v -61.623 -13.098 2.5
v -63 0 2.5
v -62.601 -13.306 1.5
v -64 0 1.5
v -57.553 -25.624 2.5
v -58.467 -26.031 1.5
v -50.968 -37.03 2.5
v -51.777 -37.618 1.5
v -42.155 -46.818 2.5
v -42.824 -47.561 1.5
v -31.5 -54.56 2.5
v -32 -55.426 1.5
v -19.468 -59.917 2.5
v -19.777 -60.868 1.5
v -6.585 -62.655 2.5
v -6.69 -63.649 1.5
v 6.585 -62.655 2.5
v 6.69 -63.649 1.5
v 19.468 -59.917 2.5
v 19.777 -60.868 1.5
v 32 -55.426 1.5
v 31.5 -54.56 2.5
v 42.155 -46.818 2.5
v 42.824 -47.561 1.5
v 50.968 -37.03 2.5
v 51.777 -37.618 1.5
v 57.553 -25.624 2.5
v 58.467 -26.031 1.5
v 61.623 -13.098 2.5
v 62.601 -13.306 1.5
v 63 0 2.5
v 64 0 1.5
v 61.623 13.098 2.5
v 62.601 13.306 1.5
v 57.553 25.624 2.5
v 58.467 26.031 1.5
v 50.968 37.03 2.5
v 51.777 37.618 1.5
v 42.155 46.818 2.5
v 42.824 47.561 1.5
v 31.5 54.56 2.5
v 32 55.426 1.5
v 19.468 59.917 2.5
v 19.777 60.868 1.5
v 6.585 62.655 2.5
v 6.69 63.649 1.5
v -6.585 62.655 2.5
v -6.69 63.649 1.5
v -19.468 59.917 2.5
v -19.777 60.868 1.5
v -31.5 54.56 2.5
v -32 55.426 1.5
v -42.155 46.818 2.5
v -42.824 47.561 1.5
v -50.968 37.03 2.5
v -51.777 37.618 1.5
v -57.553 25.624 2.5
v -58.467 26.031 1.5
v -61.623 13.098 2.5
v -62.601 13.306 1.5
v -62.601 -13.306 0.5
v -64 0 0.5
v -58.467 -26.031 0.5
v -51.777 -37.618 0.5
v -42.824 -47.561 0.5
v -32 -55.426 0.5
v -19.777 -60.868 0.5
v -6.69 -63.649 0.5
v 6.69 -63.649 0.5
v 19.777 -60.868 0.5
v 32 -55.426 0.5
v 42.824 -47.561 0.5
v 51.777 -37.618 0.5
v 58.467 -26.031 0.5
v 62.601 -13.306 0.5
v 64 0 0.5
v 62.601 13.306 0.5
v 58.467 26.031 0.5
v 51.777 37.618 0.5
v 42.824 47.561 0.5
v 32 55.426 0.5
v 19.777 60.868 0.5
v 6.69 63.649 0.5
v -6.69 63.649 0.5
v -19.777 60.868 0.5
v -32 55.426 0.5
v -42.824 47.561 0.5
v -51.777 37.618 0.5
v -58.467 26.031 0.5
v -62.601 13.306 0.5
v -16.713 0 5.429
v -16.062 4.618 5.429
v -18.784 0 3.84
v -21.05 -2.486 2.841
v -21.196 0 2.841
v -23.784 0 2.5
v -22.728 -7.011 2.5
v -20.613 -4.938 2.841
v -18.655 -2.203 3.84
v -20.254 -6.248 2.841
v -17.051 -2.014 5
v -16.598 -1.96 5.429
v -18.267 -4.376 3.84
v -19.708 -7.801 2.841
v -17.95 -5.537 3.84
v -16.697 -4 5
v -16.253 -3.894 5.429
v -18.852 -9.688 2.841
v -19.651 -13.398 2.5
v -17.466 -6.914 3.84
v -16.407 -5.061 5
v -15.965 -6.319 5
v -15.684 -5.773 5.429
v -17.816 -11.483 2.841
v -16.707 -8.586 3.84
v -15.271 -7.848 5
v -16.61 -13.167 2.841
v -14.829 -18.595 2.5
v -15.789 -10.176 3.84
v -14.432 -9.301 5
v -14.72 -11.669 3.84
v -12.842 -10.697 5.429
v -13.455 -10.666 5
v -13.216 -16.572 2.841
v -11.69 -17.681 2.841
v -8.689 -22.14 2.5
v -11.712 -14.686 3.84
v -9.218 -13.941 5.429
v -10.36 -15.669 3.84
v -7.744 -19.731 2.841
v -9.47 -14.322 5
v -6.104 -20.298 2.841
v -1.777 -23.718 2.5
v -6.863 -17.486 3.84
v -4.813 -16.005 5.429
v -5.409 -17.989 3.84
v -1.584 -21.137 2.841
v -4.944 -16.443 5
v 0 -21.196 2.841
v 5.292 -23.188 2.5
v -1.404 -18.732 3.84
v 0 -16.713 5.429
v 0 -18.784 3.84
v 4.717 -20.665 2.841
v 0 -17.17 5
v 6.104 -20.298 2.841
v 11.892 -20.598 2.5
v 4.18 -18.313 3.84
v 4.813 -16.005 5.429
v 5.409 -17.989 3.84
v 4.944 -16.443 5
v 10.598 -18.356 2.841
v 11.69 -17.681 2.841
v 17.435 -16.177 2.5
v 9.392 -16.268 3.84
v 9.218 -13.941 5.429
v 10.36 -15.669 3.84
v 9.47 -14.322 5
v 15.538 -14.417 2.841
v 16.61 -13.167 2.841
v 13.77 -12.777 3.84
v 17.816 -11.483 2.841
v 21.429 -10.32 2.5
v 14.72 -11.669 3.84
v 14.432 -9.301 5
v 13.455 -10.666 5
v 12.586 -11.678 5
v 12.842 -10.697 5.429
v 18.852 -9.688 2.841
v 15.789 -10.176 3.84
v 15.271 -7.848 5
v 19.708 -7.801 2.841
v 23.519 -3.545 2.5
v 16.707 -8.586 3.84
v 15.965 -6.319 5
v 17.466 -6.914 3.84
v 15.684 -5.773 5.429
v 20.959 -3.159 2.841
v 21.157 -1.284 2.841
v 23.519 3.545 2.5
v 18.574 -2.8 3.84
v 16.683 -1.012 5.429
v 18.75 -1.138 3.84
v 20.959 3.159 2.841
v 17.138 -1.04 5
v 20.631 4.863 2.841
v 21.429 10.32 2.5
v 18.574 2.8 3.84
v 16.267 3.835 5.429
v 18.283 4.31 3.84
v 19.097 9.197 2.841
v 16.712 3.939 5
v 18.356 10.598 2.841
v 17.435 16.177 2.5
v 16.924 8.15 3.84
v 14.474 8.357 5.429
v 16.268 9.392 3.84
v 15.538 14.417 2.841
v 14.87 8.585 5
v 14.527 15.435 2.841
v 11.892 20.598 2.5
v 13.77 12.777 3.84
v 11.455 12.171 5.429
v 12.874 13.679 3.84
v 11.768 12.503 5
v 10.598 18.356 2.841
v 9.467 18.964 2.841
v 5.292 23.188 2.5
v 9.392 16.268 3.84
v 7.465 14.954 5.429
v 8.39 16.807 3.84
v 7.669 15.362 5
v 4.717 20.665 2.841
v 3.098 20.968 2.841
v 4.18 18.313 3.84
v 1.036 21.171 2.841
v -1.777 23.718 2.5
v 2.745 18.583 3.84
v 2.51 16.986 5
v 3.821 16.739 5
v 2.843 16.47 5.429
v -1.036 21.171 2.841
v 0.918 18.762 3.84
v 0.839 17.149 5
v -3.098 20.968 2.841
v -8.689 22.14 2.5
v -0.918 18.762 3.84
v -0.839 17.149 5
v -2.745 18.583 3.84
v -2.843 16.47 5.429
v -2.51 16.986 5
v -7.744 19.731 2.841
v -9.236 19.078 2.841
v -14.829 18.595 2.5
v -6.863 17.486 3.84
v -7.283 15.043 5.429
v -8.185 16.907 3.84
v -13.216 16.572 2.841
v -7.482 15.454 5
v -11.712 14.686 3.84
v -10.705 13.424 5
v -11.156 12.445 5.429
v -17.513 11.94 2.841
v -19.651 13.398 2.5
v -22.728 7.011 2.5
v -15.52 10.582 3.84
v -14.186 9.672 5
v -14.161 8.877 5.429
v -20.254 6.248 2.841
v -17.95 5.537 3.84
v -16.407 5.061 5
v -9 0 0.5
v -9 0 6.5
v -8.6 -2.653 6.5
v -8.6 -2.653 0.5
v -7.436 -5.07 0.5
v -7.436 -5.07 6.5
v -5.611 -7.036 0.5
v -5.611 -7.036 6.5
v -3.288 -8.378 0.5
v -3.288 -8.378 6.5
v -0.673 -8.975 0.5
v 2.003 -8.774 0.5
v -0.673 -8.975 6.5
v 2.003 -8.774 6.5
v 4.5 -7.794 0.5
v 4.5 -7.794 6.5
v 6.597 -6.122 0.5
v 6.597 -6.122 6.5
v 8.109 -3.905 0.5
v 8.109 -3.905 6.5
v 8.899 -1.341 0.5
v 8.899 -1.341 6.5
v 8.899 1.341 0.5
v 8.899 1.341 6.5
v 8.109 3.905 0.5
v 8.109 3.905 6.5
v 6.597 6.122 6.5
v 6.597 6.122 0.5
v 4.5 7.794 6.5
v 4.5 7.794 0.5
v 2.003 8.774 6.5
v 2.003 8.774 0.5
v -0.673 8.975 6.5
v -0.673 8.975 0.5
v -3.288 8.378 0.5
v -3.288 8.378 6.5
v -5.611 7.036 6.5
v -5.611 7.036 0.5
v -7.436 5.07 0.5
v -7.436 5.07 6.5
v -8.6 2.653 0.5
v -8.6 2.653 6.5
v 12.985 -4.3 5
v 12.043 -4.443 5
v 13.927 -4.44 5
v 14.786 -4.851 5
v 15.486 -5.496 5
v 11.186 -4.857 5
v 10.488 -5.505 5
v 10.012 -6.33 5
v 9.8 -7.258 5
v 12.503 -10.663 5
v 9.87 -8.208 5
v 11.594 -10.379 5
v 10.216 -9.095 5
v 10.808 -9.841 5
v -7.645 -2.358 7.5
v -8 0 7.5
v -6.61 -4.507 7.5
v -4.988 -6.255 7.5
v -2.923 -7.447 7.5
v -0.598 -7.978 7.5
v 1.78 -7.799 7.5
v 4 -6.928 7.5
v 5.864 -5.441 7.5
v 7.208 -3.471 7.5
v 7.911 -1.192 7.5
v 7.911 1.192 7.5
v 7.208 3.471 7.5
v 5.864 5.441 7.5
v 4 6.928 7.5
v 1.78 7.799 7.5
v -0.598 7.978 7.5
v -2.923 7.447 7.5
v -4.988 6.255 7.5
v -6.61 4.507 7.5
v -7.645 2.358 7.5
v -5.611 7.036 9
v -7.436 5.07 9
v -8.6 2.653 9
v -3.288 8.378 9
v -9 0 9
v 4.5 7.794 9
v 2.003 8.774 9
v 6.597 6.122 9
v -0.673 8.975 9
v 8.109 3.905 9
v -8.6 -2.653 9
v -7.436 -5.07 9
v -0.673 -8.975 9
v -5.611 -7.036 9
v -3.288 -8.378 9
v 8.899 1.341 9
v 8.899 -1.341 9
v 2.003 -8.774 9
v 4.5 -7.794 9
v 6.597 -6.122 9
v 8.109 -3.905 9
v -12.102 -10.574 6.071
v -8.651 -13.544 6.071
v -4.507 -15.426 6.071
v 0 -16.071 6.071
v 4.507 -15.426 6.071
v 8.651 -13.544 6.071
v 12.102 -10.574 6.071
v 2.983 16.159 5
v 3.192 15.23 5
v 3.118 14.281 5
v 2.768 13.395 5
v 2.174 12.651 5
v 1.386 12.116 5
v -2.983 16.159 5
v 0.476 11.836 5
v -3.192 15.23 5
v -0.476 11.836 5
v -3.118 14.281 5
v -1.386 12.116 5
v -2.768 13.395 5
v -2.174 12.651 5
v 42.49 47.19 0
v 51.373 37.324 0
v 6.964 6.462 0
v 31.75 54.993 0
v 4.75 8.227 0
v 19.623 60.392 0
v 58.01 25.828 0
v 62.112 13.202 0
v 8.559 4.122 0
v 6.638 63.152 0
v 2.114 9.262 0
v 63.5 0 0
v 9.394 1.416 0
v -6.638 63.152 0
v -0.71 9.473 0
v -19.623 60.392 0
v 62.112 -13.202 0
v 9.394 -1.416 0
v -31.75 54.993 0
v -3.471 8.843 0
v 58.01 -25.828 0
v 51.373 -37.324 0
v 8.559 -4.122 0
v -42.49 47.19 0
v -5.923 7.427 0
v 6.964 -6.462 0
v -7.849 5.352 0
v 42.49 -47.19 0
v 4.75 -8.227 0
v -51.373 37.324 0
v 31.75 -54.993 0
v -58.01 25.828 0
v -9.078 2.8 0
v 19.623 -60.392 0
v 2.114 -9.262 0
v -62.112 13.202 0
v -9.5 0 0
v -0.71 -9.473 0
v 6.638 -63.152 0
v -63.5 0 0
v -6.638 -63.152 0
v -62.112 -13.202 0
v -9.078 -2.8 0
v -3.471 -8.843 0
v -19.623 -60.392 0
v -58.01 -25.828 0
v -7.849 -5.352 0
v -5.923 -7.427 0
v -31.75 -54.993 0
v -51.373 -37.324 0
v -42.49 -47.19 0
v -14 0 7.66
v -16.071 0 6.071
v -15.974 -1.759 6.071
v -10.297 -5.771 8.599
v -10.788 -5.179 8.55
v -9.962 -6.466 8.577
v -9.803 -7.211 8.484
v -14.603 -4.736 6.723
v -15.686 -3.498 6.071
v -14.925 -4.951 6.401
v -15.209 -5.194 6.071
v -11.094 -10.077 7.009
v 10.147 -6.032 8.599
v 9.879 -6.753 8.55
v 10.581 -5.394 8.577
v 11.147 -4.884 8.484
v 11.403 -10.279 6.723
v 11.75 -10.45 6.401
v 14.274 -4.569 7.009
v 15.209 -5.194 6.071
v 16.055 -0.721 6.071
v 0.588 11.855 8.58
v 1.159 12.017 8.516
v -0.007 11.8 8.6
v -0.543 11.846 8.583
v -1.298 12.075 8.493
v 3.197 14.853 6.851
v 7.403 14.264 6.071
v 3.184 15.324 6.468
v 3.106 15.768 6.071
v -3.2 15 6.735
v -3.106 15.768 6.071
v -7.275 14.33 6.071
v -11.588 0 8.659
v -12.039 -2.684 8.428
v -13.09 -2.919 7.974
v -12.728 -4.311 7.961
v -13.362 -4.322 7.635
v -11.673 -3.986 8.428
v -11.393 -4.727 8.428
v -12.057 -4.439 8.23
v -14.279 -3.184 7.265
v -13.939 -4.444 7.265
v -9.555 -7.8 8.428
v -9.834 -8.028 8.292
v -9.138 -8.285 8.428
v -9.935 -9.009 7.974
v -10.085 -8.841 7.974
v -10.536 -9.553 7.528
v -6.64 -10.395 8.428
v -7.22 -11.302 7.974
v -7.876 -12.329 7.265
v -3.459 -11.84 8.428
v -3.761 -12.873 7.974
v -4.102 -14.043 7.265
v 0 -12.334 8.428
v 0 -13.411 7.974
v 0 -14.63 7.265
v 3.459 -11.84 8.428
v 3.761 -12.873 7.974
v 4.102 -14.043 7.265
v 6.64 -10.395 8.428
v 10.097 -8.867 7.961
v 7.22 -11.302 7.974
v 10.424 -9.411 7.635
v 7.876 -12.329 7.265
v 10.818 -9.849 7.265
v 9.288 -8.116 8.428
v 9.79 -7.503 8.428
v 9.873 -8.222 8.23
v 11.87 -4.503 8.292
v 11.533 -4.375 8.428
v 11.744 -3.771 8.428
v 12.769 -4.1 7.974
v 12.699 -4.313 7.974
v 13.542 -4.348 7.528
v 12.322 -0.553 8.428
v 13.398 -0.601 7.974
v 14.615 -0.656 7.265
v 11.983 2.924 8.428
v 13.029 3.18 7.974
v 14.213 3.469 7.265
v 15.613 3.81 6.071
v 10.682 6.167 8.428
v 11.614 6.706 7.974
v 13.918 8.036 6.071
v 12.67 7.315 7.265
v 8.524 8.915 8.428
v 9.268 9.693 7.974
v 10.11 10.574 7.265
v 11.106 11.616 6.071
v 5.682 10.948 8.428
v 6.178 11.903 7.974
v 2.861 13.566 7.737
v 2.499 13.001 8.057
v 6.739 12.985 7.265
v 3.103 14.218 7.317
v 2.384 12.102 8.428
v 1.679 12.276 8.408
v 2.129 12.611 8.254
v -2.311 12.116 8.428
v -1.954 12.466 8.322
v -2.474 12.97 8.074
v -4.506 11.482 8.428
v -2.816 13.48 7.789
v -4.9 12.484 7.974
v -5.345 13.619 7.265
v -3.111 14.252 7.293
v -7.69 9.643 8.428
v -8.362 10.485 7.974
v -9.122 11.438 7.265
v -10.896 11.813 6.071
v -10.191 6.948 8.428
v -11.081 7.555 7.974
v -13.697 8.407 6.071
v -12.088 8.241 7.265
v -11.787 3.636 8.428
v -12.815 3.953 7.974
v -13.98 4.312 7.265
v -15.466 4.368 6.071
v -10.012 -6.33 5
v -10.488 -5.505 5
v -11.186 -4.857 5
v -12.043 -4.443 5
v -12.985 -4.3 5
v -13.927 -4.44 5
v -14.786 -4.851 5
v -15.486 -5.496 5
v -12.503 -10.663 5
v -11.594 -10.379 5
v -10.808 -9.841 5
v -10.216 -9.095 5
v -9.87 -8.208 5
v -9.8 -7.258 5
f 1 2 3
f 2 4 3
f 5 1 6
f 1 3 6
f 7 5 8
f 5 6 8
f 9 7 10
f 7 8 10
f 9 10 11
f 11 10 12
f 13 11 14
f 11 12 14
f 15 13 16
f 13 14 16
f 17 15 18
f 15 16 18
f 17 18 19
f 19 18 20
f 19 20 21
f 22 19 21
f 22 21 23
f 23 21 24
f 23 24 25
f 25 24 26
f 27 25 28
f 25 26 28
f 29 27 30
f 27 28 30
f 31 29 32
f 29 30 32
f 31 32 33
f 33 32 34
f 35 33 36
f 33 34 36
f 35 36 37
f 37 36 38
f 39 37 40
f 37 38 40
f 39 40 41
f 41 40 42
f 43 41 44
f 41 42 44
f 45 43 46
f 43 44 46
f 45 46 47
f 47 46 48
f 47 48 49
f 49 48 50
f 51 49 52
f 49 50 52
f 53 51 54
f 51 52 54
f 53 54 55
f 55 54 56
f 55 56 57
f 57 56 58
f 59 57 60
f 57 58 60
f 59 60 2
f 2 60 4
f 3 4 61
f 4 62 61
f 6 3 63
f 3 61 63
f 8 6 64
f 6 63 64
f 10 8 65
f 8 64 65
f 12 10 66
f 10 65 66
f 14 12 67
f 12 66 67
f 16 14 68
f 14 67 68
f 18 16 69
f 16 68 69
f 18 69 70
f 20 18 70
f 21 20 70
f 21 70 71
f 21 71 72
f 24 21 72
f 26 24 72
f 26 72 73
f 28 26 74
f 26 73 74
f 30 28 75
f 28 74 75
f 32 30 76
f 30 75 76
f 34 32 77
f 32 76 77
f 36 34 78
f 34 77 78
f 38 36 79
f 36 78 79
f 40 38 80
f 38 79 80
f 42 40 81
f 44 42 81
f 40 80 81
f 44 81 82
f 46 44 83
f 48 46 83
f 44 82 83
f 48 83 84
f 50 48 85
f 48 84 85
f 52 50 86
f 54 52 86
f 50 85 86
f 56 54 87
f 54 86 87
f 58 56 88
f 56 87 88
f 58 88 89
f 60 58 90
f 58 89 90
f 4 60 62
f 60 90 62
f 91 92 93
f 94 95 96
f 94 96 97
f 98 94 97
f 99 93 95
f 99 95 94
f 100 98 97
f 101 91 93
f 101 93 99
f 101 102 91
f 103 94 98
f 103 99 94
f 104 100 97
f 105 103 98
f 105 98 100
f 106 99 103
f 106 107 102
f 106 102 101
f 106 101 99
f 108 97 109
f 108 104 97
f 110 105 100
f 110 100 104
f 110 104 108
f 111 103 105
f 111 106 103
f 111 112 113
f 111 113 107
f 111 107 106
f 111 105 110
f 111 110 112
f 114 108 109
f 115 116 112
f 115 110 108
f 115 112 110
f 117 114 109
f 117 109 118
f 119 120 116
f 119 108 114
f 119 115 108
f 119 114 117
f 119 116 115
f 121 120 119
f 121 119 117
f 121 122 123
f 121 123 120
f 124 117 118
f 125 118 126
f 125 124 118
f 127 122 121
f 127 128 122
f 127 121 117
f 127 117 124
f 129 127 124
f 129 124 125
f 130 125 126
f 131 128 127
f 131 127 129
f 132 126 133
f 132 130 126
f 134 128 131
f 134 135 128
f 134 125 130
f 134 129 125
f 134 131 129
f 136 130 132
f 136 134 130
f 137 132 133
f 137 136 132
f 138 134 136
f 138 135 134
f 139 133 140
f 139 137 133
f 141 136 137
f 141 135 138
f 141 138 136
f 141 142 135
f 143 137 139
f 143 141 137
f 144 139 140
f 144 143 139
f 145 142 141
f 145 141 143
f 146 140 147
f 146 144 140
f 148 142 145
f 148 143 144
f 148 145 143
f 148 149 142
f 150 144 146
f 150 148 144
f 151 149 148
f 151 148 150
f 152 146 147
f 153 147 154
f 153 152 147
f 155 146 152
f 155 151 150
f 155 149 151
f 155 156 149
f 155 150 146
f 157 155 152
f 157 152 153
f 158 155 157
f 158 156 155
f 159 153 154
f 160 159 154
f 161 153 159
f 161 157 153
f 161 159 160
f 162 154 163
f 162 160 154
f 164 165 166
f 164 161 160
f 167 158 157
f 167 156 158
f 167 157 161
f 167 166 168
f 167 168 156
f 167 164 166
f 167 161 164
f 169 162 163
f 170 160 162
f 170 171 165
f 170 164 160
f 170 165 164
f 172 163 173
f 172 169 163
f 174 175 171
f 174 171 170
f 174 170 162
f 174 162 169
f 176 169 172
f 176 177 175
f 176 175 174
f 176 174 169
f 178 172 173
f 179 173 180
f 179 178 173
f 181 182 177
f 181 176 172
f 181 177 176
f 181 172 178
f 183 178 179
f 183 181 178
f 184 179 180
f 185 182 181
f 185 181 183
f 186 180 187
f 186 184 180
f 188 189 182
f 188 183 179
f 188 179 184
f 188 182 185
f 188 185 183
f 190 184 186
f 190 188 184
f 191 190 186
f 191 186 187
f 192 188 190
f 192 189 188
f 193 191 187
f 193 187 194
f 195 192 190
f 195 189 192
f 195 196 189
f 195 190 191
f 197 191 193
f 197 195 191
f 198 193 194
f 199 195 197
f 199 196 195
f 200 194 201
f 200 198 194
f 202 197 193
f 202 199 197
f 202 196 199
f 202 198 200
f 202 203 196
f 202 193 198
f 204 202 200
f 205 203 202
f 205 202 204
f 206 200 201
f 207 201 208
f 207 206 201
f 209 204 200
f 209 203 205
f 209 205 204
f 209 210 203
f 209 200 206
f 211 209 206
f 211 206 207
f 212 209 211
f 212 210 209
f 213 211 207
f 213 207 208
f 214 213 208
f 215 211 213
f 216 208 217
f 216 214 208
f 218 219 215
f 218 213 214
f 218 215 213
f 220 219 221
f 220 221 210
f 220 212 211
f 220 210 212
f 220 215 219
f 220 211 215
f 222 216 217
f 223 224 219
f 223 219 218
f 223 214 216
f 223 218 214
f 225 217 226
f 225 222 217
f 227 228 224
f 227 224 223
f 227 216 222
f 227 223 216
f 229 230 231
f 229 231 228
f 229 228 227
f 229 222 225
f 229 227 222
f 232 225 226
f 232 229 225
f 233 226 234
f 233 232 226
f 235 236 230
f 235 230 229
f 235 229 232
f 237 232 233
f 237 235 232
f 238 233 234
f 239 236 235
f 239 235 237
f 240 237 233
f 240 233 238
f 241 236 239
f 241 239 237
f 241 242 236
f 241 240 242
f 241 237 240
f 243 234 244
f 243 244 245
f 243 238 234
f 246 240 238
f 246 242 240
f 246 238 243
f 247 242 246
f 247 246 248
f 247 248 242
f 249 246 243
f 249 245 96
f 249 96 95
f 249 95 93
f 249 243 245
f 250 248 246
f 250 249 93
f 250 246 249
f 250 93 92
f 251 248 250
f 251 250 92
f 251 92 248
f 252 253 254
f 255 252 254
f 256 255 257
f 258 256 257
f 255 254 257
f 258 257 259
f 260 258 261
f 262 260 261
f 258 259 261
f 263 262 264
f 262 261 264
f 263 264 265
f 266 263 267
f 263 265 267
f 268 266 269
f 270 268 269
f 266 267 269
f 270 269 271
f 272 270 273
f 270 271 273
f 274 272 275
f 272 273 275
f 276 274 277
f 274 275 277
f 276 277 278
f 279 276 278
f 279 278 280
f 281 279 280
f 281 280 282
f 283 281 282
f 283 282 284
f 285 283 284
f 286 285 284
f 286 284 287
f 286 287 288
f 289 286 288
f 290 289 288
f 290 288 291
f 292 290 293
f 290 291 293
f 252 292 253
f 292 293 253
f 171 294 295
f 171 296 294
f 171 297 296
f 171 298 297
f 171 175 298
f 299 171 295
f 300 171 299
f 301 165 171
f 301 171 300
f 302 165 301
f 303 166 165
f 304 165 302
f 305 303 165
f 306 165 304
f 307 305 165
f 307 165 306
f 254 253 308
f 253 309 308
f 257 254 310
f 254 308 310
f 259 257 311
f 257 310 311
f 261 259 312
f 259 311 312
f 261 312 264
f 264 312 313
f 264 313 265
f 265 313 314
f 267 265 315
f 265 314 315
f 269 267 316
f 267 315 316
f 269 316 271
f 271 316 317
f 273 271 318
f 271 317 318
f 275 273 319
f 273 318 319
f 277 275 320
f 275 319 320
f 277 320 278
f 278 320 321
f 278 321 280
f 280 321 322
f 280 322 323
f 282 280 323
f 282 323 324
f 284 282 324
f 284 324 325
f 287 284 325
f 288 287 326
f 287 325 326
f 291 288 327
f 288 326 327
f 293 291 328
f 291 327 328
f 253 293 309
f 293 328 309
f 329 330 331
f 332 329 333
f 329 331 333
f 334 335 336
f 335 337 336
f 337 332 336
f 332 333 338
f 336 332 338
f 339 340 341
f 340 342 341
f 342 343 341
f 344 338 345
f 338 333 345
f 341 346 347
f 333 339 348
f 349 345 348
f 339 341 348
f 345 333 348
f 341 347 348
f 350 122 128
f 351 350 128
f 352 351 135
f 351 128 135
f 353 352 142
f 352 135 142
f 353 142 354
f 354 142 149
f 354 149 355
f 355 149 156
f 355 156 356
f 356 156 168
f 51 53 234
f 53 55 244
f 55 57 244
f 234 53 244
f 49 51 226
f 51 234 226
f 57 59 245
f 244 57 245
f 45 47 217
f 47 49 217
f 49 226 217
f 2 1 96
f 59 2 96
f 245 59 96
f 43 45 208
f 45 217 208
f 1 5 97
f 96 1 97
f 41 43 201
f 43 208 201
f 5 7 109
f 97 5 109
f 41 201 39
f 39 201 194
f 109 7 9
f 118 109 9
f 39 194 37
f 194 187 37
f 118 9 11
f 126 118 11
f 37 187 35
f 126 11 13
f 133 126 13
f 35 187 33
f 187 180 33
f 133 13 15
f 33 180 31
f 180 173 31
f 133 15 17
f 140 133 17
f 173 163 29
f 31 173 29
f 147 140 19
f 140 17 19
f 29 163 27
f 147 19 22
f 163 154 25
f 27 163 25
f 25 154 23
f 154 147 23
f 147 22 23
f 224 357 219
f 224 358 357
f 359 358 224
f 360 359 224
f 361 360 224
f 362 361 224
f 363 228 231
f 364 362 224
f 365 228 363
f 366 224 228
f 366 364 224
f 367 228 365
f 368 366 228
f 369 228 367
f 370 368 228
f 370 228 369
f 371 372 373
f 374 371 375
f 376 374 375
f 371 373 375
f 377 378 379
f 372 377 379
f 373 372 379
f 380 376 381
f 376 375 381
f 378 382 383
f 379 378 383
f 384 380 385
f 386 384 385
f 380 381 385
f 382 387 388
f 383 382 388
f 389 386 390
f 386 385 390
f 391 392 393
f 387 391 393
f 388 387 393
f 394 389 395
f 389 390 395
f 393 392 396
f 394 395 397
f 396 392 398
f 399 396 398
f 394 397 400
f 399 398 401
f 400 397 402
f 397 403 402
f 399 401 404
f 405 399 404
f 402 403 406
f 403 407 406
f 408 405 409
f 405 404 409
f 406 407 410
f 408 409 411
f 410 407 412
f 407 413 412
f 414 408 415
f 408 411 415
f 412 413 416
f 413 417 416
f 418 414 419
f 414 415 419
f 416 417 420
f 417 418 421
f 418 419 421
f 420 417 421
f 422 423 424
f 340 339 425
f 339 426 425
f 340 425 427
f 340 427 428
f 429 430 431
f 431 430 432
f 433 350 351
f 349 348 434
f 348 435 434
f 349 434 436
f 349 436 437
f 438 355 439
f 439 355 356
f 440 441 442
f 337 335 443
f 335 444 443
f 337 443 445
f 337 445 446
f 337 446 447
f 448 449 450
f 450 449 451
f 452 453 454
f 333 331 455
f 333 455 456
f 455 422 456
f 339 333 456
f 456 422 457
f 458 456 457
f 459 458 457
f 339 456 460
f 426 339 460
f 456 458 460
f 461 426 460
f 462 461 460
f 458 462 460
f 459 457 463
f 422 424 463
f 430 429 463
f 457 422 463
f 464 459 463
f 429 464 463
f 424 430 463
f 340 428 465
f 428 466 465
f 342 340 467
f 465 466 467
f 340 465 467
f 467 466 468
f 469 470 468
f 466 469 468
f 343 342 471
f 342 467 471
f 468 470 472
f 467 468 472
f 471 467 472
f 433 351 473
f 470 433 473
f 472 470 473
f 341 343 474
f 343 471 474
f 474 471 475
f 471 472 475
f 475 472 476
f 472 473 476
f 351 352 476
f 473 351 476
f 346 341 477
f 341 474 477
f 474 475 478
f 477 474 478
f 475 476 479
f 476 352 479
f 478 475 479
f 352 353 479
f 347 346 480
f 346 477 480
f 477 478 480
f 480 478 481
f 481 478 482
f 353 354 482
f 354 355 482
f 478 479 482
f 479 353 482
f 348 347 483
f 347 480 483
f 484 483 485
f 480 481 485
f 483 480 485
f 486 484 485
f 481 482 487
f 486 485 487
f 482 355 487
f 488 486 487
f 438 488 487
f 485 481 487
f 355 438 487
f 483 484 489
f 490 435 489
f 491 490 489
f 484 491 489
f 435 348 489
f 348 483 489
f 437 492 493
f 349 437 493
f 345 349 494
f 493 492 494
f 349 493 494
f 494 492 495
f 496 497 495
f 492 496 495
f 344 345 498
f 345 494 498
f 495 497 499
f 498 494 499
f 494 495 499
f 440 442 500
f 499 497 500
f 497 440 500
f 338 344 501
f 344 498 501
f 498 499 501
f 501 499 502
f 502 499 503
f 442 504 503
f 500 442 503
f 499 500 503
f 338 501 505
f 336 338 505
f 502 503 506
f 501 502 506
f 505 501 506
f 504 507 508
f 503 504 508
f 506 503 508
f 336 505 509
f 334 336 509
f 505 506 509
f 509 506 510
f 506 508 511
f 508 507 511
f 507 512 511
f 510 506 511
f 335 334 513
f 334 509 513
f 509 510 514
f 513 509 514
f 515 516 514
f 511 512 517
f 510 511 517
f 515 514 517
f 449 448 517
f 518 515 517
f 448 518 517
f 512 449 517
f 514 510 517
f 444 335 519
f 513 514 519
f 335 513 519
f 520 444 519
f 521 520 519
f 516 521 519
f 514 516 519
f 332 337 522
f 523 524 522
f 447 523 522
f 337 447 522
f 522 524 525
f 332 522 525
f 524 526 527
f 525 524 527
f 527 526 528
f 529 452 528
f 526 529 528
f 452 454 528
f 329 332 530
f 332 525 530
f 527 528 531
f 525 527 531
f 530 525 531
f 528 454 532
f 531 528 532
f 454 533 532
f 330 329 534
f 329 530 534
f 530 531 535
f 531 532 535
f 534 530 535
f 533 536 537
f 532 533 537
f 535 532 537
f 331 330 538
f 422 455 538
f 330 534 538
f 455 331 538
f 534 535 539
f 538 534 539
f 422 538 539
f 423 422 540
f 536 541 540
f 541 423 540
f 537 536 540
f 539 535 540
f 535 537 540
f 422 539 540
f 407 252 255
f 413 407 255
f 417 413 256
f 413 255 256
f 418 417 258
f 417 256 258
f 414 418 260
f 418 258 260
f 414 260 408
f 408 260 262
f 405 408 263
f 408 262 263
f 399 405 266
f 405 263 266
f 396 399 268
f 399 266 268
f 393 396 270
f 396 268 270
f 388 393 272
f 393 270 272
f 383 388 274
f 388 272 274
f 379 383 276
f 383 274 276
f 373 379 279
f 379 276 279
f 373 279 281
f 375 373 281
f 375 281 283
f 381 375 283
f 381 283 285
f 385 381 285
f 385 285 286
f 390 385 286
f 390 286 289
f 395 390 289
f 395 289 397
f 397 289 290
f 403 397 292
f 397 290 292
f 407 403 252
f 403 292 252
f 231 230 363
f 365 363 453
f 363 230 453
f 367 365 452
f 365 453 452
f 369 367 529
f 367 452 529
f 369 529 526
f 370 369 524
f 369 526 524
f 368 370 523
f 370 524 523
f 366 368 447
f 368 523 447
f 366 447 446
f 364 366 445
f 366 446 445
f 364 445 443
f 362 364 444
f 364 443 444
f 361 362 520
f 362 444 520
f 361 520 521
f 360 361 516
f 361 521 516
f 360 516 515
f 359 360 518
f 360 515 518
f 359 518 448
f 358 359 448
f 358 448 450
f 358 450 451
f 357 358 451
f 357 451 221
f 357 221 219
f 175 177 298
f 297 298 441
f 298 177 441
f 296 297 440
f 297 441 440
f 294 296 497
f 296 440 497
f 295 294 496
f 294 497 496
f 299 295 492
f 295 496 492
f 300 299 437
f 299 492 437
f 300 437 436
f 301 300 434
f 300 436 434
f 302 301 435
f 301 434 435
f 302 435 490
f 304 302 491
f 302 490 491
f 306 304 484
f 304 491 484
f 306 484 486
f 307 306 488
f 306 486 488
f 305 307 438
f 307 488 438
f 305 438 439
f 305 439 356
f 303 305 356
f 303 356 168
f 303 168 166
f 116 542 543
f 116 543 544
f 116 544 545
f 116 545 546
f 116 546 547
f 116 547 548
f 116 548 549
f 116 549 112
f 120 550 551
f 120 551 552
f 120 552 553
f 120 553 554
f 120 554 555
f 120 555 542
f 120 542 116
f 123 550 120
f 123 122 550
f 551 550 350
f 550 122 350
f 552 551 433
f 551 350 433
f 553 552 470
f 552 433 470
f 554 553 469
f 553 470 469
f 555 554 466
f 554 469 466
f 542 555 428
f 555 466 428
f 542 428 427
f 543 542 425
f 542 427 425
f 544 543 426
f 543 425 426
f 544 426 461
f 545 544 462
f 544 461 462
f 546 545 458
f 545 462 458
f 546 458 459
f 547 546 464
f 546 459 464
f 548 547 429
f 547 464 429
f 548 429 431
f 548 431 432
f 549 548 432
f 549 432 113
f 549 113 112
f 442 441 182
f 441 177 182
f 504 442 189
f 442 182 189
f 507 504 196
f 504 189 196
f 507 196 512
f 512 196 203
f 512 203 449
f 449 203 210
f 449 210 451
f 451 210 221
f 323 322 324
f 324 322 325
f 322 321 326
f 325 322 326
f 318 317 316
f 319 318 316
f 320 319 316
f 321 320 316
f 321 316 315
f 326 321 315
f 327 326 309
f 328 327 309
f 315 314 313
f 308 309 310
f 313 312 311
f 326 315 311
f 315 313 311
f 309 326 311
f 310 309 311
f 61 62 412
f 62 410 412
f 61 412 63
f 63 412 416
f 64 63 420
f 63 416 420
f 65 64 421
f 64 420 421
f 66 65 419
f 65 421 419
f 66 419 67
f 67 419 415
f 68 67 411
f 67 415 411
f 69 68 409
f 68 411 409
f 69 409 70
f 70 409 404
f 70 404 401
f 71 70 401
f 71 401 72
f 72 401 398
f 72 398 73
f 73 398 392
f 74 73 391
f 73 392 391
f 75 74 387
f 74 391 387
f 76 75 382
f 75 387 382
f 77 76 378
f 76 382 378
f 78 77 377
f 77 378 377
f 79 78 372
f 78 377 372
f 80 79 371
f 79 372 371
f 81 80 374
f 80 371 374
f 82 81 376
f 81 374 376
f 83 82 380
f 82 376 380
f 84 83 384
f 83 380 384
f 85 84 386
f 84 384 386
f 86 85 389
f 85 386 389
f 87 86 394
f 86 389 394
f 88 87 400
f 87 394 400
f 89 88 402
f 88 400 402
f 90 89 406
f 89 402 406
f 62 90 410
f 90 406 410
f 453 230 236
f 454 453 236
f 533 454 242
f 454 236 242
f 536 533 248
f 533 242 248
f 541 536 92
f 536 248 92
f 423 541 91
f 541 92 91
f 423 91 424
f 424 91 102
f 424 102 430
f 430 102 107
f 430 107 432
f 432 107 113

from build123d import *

# Parameters (mm, degrees)
CHAMFER_SIZE = 0.5
SKETCH001_R  = 3.2
POCKET_DEPTH = 4


with BuildPart() as part:
    # Sketch → Revolution (revolve)
    with BuildSketch(Plane.XZ):
        with BuildLine():
            Line((-63.5, 0), (-9, 0))
            Line((-9, 0), (-9, 6.5))
            Line((-9, 6.5), (-8, 7.5))
            Line((-8, 7.5), (0, 7.5))
            Line((0, 7.5), (0, 9))
            Line((0, 9), (-9, 9))
            ThreePointArc((-9, 9), (-12.826834, 8.238795), (-16.071068, 6.071068))
            Line((-16.071068, 6.071068), (-16.713203, 5.428932))
            ThreePointArc((-23.784271, 2.5), (-19.957437, 3.261205), (-16.713203, 5.428932))
            Line((-23.784271, 2.5), (-63, 2.5))
            Line((-63, 2.5), (-64, 1.5))
            Line((-64, 1.5), (-64, 0.5))
            Line((-64, 0.5), (-63.5, 0))
        make_face()
    revolve(axis=Axis((0, 0, 0), (0, 0, 1)))

    # Chamfer
    chamfer_edges = [part.edges().sort_by_distance(p)[0] for p in [
        (9, 0, 0),
    ]]
    chamfer(chamfer_edges, length=CHAMFER_SIZE)

    # Sketch001 (on Face13 of Chamfer) → Pocket (cut)
    with BuildSketch(Plane(origin=(0, 0, 9), x_dir=(-1, 0, 0), z_dir=(0, 0, 1))):
        with Locations((-12.990381, 7.5)):
            Circle(SKETCH001_R)
        with Locations((12.990381, 7.5)):
            Circle(SKETCH001_R)
        with Locations((0, -15)):
            Circle(SKETCH001_R)
    extrude(amount=-POCKET_DEPTH, mode=Mode.SUBTRACT)


solid = part.part
